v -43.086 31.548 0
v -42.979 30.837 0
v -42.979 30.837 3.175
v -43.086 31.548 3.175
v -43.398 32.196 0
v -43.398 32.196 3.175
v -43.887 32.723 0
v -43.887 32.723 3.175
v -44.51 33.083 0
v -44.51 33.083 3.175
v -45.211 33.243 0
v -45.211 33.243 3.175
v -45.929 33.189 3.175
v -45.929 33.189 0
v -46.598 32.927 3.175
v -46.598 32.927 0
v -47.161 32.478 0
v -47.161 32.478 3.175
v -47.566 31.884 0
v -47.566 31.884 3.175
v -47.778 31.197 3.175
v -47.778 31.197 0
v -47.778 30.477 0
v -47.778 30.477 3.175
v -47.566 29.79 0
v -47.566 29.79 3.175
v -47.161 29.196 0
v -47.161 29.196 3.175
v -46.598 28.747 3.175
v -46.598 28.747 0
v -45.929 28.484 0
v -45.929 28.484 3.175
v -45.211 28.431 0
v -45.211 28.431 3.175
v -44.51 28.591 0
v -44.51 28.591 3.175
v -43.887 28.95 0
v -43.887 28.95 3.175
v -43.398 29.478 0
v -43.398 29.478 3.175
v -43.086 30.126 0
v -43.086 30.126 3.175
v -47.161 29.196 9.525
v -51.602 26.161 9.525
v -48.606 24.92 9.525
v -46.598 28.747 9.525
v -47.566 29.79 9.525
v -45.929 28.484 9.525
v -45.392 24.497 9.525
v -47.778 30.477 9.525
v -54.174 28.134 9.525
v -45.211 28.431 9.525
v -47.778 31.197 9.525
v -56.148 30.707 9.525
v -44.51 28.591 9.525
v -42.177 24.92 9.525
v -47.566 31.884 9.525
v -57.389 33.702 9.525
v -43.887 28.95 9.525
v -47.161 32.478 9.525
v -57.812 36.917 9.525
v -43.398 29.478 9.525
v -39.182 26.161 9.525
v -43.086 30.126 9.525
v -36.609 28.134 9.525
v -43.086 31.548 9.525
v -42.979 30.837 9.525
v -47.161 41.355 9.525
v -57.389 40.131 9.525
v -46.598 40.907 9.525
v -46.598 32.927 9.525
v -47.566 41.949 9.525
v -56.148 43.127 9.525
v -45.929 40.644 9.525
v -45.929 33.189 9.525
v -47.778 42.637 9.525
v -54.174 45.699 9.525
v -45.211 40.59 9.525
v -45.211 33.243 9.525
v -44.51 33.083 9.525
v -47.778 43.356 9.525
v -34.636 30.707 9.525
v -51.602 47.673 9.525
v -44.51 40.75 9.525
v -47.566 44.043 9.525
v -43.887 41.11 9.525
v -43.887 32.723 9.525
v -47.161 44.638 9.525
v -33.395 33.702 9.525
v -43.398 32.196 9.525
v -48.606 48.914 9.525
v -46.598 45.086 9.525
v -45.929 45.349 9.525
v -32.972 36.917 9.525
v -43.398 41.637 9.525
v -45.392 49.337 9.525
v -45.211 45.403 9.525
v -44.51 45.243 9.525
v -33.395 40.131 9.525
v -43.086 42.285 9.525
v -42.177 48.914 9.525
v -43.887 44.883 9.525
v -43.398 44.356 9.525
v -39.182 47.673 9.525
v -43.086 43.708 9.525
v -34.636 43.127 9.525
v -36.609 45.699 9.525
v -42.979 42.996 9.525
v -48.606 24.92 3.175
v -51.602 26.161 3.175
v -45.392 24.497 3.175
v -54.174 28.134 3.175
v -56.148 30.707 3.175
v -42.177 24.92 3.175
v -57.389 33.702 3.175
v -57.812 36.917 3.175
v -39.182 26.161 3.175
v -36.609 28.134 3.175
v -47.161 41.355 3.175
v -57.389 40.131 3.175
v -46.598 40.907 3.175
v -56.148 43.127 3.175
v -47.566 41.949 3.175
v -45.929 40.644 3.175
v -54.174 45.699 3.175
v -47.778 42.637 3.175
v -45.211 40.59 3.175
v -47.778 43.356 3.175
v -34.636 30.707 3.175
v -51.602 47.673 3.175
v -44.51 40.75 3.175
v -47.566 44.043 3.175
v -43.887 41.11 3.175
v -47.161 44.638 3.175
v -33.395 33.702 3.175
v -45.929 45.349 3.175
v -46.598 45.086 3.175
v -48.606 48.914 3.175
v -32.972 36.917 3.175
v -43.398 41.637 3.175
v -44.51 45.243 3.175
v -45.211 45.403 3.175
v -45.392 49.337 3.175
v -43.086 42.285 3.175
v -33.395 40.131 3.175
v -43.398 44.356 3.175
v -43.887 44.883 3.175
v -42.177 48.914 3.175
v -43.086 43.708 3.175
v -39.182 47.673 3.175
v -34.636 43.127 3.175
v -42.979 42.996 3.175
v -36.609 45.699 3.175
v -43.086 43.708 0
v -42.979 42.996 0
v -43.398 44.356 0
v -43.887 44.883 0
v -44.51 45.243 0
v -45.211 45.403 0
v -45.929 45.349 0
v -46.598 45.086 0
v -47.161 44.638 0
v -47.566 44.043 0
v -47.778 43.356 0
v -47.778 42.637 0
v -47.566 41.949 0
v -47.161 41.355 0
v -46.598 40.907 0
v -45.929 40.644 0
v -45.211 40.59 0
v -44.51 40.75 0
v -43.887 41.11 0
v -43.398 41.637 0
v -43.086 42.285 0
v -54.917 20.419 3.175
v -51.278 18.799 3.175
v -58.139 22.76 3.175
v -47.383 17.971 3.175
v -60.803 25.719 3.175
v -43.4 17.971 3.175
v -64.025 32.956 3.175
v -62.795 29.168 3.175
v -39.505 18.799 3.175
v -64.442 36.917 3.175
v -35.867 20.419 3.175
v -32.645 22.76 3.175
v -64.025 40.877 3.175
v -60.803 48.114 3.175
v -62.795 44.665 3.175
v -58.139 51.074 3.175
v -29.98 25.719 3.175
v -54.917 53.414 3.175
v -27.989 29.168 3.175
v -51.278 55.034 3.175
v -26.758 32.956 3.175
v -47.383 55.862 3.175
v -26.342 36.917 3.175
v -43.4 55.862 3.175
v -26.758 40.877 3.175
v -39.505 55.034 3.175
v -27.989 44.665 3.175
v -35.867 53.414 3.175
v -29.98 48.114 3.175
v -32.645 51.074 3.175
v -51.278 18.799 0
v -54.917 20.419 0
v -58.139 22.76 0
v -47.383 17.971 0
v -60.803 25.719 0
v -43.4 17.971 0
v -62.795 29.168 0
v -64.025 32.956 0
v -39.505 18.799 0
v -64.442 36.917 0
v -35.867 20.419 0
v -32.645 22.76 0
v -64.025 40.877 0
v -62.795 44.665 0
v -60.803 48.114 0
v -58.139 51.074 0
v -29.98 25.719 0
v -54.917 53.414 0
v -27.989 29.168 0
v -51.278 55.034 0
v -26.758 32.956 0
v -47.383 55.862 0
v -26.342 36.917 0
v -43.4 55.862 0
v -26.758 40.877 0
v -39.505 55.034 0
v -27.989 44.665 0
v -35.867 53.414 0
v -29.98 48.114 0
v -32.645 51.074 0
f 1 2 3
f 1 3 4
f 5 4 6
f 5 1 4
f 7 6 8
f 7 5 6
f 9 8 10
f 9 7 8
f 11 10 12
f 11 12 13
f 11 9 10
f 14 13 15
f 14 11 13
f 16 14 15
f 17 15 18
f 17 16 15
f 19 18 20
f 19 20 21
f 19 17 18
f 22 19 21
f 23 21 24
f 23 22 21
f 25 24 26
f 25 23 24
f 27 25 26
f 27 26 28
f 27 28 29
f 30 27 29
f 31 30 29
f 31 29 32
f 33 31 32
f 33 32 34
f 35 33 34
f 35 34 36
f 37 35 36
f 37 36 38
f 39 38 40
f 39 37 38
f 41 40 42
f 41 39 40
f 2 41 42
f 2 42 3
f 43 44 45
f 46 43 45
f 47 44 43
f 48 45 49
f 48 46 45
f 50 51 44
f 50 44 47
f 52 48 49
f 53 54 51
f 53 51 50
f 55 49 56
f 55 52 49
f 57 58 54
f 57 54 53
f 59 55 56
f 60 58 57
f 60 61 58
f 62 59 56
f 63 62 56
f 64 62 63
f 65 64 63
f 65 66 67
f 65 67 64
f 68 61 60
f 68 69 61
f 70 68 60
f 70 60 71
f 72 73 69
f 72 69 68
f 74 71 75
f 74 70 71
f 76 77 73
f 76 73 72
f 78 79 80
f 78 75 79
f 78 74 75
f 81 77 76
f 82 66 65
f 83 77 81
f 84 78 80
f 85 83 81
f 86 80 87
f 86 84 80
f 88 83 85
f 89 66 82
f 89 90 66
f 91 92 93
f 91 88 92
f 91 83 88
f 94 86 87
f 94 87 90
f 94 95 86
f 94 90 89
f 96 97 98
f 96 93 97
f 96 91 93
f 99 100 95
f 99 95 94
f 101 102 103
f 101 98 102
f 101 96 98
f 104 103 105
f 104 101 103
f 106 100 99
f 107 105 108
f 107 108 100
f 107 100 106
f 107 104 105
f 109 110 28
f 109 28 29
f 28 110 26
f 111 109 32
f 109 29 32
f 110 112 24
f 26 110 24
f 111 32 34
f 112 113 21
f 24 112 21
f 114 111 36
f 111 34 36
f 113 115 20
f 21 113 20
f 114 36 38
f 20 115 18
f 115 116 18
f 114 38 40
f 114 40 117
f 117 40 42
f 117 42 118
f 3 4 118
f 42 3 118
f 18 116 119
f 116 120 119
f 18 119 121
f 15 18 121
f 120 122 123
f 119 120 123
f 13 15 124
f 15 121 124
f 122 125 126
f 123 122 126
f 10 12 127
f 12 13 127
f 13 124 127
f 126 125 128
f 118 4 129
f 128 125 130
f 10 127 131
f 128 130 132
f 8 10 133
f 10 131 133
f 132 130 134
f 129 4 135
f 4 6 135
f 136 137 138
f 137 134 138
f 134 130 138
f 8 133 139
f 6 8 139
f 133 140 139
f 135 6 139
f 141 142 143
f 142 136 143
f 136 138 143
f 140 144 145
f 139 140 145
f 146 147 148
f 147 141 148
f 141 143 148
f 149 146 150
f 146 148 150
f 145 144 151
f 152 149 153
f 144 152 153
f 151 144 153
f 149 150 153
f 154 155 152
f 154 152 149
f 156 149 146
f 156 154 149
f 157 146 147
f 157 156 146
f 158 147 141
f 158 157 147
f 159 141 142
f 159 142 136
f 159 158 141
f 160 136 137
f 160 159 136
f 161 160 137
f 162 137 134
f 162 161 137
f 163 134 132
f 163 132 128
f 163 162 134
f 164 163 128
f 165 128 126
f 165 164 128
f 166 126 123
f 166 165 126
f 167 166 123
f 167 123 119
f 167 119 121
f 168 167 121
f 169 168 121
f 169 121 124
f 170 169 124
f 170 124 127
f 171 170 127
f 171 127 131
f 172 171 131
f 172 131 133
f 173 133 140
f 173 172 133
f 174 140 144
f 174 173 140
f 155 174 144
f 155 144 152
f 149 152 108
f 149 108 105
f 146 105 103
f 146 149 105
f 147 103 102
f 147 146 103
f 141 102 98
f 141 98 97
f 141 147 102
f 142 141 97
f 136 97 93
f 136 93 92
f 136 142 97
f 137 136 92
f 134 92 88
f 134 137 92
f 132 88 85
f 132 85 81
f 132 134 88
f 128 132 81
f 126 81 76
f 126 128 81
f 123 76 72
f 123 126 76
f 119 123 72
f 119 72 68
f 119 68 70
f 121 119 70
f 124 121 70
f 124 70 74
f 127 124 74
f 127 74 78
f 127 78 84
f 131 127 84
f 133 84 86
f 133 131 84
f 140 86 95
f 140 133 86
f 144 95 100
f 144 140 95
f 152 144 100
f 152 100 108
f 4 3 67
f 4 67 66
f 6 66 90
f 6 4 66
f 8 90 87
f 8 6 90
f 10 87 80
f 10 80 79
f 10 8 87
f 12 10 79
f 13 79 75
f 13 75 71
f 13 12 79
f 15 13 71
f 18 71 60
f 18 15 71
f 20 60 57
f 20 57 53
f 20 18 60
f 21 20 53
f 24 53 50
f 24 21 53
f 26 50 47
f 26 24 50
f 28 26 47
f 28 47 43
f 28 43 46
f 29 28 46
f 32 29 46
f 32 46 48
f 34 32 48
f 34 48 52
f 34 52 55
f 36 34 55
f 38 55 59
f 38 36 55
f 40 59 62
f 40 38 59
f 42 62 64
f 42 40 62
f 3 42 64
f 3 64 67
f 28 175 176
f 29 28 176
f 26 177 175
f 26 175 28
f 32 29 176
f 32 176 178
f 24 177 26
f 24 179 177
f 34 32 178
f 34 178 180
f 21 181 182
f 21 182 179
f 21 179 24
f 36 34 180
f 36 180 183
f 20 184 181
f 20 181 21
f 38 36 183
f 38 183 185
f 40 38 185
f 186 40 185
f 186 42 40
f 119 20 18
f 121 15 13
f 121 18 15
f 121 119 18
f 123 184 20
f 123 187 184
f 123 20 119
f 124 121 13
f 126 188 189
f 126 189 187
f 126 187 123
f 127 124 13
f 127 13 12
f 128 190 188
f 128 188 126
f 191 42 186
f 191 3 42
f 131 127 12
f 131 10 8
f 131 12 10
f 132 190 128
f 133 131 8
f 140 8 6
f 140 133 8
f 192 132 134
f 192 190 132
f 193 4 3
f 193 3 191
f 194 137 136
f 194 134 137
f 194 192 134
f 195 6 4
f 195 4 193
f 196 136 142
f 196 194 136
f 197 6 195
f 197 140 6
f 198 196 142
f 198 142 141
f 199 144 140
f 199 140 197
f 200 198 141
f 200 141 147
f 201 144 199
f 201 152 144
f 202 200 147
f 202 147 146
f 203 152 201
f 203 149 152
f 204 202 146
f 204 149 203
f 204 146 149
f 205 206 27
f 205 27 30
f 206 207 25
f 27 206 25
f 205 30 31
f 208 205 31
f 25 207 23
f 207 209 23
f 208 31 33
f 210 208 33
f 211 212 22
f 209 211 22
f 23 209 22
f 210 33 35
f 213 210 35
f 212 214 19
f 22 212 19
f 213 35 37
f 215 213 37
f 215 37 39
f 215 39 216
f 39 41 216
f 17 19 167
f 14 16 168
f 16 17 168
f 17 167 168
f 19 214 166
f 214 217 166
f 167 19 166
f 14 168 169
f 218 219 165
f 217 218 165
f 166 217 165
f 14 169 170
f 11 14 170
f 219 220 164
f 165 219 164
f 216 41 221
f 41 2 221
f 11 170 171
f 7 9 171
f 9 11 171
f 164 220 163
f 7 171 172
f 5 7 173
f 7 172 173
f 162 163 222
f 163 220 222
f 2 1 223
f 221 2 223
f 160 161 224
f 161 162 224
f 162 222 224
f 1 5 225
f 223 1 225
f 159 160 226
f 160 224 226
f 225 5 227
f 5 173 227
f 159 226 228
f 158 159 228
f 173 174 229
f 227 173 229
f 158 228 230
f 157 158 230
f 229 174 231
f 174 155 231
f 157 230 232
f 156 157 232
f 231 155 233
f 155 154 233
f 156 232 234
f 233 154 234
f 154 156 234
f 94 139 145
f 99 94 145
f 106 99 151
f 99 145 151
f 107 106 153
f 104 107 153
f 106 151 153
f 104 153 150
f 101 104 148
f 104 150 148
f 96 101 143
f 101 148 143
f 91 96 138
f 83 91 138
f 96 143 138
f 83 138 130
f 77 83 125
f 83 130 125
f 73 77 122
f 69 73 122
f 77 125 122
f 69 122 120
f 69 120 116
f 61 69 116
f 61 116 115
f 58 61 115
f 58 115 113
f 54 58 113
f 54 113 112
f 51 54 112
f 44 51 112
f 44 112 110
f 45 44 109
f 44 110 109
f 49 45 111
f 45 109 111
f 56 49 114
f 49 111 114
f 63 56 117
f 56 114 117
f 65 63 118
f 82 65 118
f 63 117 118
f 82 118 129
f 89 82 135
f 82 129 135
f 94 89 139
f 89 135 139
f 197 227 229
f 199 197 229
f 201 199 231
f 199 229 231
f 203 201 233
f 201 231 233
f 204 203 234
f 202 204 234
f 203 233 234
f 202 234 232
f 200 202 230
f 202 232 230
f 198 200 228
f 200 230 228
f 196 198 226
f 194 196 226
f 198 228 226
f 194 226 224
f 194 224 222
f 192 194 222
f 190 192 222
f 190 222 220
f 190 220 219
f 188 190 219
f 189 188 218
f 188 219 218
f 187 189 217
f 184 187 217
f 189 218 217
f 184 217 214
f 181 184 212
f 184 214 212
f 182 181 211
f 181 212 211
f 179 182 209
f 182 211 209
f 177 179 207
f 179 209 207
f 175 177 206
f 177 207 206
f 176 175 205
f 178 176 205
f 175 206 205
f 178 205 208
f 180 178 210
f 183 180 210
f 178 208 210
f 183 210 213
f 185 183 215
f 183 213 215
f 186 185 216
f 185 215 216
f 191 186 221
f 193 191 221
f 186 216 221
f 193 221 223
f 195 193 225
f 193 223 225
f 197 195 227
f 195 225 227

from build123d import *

# Parameters (mm, degrees)
F1_R     = 19.05
F1_R_2   = 2.413
F2_DEPTH = 3.175
F3_R     = 12.4201168804
F3_R_2   = 2.413
F4_DEPTH = 6.35


# Not quite as in the source:
# - a length typed as a fraction of an inch, garbled in the dataset ("3 / 203.2 mm" for 3/8 in), is restored


with BuildPart() as f2:
    # F1 (on Top) → F2 (new body)
    with BuildSketch(Plane.XY):
        with Locations((-45.3916713595, 36.9166433811)):
            Circle(F1_R)
        with Locations((-45.3916713595, 30.8369403438)):
            Circle(F1_R_2, mode=Mode.SUBTRACT)
        with Locations((-45.3916713595, 42.9963464184)):
            Circle(F1_R_2, mode=Mode.SUBTRACT)
    extrude(amount=F2_DEPTH)


with BuildPart() as f4:
    # F3 (on face) → F4 (new body)
    with BuildSketch(Plane.XY.offset(3.175)):
        with Locations((-45.3916713595, 36.9166433811)):
            Circle(F3_R)
        with Locations((-45.3916713595, 30.8369403438)):
            Circle(F3_R_2, mode=Mode.SUBTRACT)
        with Locations((-45.3916713595, 42.9963464184)):
            Circle(F3_R_2, mode=Mode.SUBTRACT)
    extrude(amount=F4_DEPTH)


solid = Compound([f2.part, f4.part])
